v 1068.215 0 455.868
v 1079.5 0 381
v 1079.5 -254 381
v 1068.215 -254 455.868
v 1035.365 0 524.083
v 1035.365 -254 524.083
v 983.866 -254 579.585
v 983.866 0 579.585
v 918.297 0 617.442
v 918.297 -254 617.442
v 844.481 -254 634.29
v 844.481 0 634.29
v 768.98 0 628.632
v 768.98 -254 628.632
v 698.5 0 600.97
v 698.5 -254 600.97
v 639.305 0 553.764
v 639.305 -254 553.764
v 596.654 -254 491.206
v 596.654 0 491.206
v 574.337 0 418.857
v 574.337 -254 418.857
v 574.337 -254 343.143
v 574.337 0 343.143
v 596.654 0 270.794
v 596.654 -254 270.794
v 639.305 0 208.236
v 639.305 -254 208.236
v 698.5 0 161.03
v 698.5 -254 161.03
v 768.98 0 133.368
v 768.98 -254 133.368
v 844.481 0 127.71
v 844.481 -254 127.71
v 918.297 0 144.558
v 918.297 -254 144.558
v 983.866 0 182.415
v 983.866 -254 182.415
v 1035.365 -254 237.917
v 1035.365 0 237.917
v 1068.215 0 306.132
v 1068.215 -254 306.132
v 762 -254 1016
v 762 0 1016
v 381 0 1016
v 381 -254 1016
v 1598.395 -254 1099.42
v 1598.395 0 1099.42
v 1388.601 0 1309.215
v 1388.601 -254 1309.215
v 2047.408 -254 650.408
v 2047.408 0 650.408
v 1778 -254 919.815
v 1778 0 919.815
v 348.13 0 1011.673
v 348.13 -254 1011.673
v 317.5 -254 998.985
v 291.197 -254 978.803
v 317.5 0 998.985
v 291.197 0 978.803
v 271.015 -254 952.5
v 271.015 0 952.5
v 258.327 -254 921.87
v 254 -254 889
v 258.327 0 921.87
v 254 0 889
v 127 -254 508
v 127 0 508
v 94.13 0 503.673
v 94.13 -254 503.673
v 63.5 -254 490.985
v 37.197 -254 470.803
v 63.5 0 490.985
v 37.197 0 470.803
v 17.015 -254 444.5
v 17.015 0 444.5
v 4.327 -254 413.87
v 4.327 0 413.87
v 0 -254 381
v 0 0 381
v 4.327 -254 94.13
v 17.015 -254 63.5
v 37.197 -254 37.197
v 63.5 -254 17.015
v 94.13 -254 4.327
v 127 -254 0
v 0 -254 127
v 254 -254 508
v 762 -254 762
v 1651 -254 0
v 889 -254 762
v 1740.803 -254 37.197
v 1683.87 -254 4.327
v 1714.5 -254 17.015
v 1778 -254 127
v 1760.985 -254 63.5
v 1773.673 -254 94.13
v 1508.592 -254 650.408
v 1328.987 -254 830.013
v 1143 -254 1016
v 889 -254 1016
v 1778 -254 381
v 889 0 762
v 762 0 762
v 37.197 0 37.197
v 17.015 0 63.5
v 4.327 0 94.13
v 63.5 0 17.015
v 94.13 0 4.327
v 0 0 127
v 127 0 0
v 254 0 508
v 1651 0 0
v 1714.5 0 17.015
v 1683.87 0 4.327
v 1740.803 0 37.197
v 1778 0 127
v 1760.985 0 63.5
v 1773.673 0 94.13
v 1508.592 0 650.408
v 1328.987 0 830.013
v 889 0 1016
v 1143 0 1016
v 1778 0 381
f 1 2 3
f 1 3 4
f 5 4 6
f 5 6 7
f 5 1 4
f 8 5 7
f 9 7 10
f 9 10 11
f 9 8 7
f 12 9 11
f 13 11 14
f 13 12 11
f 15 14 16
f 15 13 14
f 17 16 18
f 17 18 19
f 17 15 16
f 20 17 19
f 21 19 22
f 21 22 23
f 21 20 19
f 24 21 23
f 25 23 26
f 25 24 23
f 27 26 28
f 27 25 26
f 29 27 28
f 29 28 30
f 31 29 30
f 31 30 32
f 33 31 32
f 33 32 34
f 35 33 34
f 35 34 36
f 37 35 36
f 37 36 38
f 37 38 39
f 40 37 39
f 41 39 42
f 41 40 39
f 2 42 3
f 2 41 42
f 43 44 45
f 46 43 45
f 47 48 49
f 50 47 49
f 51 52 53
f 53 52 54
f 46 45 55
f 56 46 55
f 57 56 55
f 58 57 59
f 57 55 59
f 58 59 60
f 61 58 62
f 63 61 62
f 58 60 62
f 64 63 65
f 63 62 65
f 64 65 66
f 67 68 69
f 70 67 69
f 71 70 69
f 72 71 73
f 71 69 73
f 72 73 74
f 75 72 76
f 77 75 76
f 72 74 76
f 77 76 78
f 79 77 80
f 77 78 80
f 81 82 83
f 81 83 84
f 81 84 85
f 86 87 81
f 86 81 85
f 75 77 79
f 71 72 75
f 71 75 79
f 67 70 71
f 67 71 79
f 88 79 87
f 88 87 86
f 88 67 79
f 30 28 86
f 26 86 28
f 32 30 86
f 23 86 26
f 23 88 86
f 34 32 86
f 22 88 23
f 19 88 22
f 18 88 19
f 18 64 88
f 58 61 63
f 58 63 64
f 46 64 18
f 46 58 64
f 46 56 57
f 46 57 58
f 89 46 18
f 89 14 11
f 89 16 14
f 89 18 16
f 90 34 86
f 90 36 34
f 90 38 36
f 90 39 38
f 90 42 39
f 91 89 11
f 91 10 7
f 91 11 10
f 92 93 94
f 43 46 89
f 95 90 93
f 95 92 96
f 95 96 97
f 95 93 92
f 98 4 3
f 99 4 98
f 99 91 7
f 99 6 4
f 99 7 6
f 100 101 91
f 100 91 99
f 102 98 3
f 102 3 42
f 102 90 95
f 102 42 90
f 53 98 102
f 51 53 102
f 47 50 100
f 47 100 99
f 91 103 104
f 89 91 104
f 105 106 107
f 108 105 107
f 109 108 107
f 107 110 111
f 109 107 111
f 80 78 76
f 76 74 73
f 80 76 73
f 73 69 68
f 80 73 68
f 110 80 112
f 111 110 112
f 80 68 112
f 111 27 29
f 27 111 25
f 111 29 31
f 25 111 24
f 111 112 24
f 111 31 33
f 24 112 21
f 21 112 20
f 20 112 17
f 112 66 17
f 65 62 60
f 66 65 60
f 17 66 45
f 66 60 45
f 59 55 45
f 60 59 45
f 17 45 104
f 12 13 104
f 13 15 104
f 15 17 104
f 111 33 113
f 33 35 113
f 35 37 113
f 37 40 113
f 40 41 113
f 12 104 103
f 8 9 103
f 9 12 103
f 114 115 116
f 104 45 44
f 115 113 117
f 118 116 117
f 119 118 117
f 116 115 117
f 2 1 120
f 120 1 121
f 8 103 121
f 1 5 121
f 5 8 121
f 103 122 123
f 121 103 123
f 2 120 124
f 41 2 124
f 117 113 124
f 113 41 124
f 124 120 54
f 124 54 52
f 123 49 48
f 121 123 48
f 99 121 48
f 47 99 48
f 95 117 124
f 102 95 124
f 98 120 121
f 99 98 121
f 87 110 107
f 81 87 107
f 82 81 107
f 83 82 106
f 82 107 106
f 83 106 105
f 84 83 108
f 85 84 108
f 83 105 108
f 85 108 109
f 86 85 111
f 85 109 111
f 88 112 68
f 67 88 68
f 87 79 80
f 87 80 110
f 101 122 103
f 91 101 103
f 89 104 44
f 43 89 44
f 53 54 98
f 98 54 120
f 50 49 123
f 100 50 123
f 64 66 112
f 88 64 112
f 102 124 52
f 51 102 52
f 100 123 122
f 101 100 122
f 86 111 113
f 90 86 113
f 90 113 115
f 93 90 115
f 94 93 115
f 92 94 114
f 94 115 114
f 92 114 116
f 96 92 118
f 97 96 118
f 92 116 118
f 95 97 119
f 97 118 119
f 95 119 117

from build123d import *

# Parameters (mm, degrees)
F0_R     = 254
F1_DEPTH = 254


with BuildPart() as f1:
    # F0 (on Front) → F1 (new body)
    with BuildSketch(Plane.XZ):
        with BuildLine():
            ThreePointArc((0, 127), (37.197439, 37.197439), (127, 0))
            Line((127, 0), (1651, 0))
            ThreePointArc((1651, 0), (1740.802561, 37.197439), (1778, 127))
            Line((1778, 127), (1778, 381))
            Line((1778, 381), (2047.407684, 650.407684))
            Line((2047.407684, 650.407684), (1778, 919.815367))
            Line((1778, 919.815367), (1508.592316, 650.407684))
            Line((1508.592316, 650.407684), (1328.987194, 830.012806))
            Line((1328.987194, 830.012806), (1598.394878, 1099.42049))
            Line((1598.394878, 1099.42049), (1388.600741, 1309.214626))
            Line((1388.600741, 1309.214626), (1143, 1016))
            Line((1143, 1016), (889, 1016))
            Line((889, 1016), (889, 762))
            Line((889, 762), (762, 762))
            Line((762, 762), (762, 1016))
            Line((762, 1016), (381, 1016))
            ThreePointArc((381, 1016), (291.197439, 978.802561), (254, 889))
            Line((254, 889), (254, 508))
            Line((254, 508), (127, 508))
            ThreePointArc((127, 508), (37.197439, 470.802561), (0, 381))
            Line((0, 381), (0, 127))
        make_face()
        with Locations((825.5, 381)):
            Circle(F0_R, mode=Mode.SUBTRACT)
    extrude(amount=F1_DEPTH)


solid = f1.part
